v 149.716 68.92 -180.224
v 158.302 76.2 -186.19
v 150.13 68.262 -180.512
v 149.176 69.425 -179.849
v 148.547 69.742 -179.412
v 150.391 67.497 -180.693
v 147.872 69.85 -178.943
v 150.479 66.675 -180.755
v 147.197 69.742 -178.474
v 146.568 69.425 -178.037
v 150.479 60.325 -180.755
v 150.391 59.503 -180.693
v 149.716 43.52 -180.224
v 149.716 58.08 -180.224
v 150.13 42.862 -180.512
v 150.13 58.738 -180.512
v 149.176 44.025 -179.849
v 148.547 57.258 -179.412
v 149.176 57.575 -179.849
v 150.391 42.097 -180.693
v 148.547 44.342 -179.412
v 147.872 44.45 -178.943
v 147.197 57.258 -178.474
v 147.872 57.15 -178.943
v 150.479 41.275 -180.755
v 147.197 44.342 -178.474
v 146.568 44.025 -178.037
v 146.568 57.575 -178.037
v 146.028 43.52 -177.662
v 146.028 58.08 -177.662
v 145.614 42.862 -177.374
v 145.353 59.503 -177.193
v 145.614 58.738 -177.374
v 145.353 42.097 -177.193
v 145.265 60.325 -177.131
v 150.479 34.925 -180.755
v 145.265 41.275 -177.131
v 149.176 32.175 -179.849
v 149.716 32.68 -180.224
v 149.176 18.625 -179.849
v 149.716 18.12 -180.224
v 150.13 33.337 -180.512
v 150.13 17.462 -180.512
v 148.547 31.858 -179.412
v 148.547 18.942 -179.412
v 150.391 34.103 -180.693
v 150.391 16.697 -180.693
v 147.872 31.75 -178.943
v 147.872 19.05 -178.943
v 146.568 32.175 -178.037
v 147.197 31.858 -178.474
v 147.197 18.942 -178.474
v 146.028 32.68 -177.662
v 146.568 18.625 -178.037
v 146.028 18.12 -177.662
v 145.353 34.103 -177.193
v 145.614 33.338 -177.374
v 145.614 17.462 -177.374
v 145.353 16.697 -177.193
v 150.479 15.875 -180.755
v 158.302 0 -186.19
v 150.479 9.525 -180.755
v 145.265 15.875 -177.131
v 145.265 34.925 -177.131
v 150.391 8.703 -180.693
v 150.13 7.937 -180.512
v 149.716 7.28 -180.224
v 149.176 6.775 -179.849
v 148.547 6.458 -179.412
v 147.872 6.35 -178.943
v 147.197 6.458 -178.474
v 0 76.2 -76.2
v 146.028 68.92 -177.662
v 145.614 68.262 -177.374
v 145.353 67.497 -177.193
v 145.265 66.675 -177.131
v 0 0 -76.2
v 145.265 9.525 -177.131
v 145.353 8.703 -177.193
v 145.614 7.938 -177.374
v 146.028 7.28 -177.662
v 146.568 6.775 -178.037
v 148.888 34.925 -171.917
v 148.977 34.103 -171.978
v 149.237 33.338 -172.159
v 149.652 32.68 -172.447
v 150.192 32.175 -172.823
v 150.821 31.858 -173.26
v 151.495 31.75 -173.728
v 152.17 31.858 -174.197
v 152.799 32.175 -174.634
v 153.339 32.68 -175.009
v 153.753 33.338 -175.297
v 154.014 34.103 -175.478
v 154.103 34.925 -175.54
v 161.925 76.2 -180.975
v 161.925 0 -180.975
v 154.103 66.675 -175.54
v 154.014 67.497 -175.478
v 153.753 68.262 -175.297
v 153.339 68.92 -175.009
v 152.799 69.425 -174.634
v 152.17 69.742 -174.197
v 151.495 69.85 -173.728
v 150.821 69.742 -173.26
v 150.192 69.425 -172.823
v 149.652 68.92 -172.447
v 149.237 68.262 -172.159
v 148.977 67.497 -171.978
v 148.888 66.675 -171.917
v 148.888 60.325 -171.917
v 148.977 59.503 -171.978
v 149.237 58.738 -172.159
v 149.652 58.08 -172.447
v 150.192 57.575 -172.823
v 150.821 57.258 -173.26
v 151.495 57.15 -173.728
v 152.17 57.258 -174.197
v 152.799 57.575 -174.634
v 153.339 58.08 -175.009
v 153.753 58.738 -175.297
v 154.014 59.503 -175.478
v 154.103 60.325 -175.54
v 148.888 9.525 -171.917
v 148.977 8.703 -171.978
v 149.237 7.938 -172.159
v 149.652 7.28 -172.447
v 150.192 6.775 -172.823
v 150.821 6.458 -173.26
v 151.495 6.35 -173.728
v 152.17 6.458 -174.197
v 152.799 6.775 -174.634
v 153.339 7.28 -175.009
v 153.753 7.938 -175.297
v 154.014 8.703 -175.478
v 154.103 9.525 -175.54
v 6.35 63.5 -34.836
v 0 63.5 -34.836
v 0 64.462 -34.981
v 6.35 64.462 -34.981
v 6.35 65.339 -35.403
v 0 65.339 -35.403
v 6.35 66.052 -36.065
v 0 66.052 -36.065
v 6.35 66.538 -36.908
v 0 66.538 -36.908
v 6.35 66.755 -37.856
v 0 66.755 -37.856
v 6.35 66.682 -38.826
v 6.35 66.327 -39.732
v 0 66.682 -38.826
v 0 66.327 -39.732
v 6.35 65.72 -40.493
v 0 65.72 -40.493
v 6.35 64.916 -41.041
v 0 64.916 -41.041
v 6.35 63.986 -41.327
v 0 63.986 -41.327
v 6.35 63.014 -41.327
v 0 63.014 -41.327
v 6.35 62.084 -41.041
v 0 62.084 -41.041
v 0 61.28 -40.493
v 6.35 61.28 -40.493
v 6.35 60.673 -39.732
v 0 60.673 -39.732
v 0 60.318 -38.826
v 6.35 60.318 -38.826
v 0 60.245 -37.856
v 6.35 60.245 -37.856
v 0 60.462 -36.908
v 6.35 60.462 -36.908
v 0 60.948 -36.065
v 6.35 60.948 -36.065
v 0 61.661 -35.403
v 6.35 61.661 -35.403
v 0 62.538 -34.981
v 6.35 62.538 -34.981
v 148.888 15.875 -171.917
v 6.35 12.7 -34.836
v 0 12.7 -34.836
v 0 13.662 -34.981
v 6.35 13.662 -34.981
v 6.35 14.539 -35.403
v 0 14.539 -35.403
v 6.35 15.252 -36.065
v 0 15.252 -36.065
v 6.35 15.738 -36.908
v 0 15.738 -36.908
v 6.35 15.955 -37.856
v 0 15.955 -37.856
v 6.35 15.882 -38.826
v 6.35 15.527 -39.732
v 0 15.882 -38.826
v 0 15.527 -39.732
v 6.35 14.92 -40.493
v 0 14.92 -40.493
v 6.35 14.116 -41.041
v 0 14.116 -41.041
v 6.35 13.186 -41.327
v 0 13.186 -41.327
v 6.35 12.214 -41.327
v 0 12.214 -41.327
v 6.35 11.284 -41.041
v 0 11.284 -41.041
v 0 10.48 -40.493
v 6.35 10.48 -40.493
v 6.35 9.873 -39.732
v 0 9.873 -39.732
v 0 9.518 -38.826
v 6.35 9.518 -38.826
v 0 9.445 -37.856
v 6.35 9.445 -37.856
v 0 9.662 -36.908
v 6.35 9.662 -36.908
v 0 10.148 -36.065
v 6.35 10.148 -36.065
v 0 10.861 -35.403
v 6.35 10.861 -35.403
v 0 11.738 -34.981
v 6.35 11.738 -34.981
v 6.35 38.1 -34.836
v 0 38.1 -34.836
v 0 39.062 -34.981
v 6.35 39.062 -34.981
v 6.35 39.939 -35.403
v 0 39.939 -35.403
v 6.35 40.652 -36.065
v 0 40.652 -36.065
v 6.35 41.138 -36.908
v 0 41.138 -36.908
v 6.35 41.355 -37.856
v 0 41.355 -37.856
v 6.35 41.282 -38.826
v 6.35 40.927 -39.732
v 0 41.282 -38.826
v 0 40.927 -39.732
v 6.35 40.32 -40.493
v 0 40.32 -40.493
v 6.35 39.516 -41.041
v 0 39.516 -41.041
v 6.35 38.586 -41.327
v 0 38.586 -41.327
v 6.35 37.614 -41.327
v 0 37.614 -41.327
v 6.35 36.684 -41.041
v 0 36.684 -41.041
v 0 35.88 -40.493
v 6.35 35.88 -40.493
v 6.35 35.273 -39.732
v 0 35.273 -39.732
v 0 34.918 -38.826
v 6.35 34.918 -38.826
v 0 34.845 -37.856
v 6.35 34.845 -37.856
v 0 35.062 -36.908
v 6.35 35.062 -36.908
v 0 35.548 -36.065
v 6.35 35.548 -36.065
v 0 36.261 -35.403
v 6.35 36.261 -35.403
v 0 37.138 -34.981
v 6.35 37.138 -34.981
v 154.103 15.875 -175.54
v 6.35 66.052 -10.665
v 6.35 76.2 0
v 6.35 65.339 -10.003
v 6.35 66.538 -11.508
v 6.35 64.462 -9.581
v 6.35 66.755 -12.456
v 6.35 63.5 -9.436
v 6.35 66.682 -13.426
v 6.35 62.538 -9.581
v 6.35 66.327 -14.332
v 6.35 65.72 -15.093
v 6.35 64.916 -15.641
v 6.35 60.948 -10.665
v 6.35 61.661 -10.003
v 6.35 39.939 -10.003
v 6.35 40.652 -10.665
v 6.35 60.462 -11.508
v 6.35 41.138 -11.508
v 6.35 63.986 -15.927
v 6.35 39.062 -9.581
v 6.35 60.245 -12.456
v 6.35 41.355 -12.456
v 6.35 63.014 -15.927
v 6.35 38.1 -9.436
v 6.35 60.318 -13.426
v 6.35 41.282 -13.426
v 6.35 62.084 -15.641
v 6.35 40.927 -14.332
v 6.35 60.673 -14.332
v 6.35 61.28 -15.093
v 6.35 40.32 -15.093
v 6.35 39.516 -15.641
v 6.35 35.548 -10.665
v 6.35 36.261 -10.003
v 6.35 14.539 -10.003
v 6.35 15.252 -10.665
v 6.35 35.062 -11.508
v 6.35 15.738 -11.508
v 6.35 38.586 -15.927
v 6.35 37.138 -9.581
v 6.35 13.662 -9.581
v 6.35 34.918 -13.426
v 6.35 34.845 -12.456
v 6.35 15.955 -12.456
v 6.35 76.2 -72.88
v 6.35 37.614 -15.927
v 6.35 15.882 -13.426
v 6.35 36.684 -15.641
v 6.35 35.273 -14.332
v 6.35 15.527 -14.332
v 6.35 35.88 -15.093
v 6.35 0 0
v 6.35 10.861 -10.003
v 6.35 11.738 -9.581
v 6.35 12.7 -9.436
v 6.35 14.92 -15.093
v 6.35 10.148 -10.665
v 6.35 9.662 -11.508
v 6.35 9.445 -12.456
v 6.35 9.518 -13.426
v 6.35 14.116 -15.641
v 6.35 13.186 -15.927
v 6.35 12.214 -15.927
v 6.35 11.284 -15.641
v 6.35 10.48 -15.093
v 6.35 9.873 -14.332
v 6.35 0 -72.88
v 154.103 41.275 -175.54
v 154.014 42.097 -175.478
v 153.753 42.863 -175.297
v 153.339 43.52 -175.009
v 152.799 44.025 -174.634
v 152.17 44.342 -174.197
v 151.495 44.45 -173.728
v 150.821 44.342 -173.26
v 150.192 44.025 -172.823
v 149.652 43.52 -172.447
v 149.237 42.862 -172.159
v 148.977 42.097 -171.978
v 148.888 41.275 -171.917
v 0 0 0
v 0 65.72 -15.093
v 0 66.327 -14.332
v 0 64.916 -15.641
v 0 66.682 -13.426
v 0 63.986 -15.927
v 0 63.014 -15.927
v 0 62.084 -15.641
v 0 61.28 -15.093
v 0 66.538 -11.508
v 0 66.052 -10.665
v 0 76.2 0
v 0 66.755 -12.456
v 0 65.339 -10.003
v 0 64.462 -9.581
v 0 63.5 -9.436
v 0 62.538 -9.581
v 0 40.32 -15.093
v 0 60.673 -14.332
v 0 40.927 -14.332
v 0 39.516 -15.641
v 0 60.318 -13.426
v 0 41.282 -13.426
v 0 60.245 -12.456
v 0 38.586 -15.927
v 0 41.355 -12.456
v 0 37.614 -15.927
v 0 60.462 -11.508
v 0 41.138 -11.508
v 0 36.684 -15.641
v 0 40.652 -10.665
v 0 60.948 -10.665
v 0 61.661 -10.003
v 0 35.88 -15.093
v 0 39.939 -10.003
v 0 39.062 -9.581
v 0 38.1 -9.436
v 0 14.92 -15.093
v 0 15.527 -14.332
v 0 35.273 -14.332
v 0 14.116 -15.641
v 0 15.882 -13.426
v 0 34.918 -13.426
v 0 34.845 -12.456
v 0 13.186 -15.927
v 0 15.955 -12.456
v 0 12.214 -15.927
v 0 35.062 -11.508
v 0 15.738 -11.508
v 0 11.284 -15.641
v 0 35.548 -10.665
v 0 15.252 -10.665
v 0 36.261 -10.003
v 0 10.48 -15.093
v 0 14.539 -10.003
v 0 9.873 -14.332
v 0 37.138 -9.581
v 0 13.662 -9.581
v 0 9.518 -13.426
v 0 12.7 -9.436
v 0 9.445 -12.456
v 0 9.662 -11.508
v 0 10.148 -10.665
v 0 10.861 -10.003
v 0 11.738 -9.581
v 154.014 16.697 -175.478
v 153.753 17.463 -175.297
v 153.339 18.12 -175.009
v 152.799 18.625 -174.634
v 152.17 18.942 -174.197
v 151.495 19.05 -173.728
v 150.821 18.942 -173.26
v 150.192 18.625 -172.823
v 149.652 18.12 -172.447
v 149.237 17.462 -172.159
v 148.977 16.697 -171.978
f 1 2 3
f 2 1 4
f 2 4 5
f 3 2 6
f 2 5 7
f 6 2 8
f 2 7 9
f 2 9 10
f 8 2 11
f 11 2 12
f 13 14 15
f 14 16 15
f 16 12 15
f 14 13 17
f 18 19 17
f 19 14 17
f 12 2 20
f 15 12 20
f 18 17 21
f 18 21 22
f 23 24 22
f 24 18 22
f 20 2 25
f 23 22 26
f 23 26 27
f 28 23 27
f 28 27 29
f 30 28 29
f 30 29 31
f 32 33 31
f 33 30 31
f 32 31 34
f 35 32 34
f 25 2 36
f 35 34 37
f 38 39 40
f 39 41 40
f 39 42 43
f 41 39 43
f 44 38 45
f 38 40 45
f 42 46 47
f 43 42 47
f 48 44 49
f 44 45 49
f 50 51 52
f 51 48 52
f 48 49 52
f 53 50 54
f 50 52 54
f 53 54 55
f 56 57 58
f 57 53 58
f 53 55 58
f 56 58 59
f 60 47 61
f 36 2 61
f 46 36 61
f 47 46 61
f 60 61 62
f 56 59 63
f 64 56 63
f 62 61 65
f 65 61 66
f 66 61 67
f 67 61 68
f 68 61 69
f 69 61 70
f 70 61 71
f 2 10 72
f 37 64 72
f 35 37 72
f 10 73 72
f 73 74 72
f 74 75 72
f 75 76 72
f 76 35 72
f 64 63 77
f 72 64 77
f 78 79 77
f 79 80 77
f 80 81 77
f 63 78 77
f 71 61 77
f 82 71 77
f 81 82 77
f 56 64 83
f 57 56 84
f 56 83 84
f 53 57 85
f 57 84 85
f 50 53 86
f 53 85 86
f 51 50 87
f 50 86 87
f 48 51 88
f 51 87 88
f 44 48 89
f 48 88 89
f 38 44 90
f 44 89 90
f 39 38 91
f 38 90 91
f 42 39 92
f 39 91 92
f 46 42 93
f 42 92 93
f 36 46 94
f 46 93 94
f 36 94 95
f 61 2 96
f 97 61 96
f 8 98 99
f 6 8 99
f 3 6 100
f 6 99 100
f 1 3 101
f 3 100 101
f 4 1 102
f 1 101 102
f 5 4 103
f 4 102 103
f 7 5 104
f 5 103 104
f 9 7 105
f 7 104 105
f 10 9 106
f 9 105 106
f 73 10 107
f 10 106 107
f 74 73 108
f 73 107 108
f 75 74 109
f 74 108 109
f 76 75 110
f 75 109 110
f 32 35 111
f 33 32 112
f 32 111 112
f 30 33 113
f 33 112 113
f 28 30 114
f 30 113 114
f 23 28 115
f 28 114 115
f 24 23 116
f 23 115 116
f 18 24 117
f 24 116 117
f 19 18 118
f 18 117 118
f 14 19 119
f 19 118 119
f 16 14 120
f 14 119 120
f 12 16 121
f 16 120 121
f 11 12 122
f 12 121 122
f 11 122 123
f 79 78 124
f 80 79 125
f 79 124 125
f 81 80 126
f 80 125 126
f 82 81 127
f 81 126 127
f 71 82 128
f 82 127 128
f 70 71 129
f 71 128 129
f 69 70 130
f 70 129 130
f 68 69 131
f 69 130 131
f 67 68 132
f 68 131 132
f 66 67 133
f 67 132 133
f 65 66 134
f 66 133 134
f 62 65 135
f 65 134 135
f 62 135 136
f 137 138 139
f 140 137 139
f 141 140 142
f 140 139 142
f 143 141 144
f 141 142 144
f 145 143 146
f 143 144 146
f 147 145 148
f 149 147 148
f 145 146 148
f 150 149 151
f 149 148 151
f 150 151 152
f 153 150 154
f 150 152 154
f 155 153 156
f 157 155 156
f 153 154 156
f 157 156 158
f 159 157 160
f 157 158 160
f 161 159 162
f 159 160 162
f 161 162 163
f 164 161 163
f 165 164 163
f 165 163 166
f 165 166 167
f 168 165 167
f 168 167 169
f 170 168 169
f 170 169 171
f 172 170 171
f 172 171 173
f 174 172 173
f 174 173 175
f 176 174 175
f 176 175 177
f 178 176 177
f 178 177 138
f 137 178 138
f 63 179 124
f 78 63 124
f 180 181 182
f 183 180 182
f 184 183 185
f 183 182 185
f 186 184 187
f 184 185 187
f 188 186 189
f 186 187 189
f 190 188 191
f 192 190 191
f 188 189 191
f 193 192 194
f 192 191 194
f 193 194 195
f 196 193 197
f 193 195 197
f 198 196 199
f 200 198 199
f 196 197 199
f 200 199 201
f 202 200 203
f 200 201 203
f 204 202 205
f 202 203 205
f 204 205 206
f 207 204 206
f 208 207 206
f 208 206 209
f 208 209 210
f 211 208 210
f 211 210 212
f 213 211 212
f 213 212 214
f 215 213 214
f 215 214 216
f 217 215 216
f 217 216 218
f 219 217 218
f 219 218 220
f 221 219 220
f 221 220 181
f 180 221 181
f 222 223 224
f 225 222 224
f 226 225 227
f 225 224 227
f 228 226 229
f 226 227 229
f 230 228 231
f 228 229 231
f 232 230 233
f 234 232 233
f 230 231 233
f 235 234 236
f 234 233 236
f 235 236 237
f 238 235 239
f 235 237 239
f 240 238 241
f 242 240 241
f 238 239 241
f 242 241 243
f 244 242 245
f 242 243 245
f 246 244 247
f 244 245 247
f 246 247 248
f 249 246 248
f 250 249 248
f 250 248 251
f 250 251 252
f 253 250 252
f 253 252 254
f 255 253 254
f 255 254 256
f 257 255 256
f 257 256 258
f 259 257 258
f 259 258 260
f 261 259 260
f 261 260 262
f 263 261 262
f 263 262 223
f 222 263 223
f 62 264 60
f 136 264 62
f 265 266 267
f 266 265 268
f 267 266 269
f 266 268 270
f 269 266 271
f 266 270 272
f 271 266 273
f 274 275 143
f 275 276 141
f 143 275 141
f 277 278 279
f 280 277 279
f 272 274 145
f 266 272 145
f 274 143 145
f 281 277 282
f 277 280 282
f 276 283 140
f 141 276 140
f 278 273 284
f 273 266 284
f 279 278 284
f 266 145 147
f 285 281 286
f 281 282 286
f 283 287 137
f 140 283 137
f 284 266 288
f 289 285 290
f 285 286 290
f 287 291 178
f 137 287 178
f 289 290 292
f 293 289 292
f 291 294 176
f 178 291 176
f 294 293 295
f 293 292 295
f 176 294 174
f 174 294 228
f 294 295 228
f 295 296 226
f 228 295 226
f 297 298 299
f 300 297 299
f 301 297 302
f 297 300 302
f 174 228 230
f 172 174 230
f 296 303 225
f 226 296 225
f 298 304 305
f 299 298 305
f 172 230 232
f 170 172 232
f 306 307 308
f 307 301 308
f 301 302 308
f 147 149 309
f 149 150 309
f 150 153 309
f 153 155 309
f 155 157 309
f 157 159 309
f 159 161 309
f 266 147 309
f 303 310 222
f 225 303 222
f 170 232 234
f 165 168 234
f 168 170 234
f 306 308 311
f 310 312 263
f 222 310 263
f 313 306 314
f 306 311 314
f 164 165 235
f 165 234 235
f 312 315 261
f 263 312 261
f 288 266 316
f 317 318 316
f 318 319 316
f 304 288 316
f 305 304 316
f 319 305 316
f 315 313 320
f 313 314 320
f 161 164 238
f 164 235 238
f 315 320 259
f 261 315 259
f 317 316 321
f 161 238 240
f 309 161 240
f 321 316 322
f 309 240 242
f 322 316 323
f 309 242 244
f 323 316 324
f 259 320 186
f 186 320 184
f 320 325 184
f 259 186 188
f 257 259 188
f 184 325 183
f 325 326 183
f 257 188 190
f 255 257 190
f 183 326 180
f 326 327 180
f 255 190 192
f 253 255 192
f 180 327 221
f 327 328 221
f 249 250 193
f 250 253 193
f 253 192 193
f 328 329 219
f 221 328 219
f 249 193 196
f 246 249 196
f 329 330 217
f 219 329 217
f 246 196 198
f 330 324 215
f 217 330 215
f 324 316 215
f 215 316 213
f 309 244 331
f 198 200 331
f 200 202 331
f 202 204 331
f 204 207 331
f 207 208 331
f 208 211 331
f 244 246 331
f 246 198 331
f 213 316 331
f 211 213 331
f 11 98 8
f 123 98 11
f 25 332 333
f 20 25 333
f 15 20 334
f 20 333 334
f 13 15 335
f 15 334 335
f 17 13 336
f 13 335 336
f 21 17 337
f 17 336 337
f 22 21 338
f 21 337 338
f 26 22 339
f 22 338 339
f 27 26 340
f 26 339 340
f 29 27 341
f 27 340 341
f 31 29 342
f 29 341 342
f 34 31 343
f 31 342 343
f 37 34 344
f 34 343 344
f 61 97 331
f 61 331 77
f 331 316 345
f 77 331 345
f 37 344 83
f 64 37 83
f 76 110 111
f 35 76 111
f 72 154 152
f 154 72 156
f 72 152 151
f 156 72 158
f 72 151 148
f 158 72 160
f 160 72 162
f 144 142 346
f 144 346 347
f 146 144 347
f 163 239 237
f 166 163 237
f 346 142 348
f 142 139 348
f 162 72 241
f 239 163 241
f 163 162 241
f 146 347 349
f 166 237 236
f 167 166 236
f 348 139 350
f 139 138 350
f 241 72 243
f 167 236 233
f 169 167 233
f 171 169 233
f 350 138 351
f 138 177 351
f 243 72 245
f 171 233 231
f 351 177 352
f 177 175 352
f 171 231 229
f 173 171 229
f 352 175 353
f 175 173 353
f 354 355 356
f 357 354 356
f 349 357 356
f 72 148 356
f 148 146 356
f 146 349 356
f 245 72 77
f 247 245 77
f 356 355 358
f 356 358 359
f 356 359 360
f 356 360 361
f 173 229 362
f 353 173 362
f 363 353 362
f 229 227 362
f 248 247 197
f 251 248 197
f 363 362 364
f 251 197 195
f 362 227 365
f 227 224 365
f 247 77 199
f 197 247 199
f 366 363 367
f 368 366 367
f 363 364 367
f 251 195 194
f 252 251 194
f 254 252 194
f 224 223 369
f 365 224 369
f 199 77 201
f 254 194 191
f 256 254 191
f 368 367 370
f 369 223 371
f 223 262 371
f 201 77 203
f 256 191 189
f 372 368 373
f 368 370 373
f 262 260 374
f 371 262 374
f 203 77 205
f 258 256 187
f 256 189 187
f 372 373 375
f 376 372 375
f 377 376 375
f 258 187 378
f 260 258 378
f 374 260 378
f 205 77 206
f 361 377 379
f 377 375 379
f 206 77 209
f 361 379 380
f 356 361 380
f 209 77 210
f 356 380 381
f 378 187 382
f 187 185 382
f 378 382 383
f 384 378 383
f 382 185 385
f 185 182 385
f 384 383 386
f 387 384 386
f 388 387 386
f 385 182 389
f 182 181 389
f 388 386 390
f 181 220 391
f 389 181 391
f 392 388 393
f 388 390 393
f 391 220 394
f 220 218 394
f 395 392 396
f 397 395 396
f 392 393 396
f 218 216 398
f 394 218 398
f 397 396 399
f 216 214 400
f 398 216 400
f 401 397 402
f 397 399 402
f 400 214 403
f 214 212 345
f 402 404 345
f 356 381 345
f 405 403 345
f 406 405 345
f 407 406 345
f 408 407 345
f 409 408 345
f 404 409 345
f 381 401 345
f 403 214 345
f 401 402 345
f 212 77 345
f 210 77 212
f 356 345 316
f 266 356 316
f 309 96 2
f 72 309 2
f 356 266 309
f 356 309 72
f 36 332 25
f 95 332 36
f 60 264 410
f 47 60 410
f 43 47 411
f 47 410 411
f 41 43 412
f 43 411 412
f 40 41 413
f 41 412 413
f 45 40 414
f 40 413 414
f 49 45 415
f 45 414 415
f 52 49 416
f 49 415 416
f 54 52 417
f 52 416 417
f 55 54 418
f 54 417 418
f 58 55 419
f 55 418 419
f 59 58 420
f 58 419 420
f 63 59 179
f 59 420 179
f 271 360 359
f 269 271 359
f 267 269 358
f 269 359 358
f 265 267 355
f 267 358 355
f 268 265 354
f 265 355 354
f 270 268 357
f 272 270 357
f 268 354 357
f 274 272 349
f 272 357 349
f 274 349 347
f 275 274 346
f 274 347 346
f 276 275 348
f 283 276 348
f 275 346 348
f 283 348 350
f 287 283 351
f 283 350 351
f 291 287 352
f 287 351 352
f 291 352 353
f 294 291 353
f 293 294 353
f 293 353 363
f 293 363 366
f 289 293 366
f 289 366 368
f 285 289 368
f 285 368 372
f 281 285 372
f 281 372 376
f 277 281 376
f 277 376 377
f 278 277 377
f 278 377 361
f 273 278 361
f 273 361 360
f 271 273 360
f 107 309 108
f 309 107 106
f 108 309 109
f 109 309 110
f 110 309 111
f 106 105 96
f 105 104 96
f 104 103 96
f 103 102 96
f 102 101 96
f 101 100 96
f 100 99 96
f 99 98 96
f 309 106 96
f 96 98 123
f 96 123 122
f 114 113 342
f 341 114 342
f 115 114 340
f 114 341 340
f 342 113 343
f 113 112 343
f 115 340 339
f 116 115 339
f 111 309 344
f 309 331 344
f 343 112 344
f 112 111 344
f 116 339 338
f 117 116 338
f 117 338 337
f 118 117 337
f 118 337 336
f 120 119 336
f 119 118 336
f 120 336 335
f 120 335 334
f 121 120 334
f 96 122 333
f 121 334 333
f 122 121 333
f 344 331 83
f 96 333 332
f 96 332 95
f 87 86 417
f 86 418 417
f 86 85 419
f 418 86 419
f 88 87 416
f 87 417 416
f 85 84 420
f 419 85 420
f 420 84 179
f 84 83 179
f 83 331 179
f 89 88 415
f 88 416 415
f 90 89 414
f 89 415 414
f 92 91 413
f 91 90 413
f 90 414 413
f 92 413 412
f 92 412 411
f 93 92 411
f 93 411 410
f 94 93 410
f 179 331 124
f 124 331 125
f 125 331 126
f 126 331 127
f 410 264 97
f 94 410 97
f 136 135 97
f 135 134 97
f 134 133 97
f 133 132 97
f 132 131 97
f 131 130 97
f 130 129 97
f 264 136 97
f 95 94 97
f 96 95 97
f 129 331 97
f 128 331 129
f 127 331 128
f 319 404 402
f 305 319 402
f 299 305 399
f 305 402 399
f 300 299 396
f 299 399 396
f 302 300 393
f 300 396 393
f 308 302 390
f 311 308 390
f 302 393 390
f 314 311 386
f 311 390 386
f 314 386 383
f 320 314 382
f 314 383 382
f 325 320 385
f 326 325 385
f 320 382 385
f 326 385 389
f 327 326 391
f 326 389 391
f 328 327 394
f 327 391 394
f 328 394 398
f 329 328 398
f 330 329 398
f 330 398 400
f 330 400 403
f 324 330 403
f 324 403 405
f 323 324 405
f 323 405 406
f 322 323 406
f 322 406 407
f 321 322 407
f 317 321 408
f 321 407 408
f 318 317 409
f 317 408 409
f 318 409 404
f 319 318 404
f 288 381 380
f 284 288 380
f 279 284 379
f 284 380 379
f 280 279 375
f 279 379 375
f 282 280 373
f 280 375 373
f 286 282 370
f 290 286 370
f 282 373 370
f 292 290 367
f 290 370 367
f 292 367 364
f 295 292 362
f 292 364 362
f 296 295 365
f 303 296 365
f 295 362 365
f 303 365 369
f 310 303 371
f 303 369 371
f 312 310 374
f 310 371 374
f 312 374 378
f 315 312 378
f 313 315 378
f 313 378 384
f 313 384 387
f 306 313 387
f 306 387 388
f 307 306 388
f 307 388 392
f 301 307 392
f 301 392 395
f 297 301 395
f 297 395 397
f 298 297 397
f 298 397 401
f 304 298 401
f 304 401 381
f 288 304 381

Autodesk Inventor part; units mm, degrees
ref_plane "YZ Plane" through (0, 0, 0) normal (1, 0, 0) x (0, 1, 0)
ref_plane "XZ Plane" through (0, 0, 0) normal (0, 1, 0) x (-1, 0, 0)
ref_plane "XY Plane" through (0, 0, 0) normal (0, 0, 1) x (1, 0, 0)
sketch "Sketch1" plane through (0, 0, 0) normal (0, 1, 0) x (-1, 0, 0)
  line L0 (0, 0) -> (-6.35, 0)
  line L1 (-6.35, 0) -> (-6.35, -76.2)
  line L2 (-6.35, -76.2) -> (0, -76.2)
  line L3 (0, -76.2) -> (0, 0)
  line L4 (-6.35, -72.8797) -> (-161.925, -180.975)
  line L5 (-158.3017, -186.1898) -> (0, -76.2)
  line L6 (-158.3017, -186.1898) -> (-161.925, -180.975)
  point P0 (-6.35, -38.1)
  point P1 (-3.175, -76.2)
  point P2 (-6.35, -6.35)
  dimension "d9" = 6.35
  dimension "d10" = 76.2
  dimension "d30" = 6.35
  dimension "d31" = 6.35
  dimension "d32" = 155.575
  dimension "d33" = 174.625
  dimension "d53" = 6.35
extrude "Extrusion1" add sketch "Sketch1" along normal blind 76.2
sketch "Sketch2" plane through (0, 0, -76.2) normal (-1, 0, 0) x (0, 0, 1)
  circle A0 centre (63.5, 12.7) radius 3.2639
  circle A1 centre (63.5, 38.1) radius 3.2639
  circle A2 centre (63.5, 63.5) radius 3.2639
  line L0 (0, 0) -> (0, 76.2) projected
  line L1 (0, 0) -> (76.2, 0) projected
  line L2 (76.2, 0) -> (76.2, 76.2) projected
  circle A3 centre (38.1, 63.5) radius 3.2639
  circle A4 centre (38.1, 38.1) radius 3.2639
  circle A5 centre (38.1, 12.7) radius 3.2639
  dimension "d18" = 6.5278
  dimension "d19" = 25.4
  dimension "d21" = 25.4
  dimension "d22" = 12.7
  dimension "d34" = 12.7
  dimension "d35" = 25.4
  dimension "d36" = 25.4
  dimension "d38" = 25.4
extrude "Extrusion2" cut sketch "Sketch2" against normal through all
sketch "Sketch4" plane through (161.925, 0, -180.975) normal (0.5706, 0, 0.8212) x (0.8212, 0, -0.5706)
  arc A0 (-9.525, 66.675) -> (-15.875, 66.675) centre (-12.7, 66.675) ccw
  arc A1 (-15.875, 60.325) -> (-9.525, 60.325) centre (-12.7, 60.325) ccw
  line L0 (-12.7, 76.4683) -> (-12.7, 0) construction
  line L1 (-189.4417, 0) -> (0, 0) construction
  line L2 (0, 0) -> (0, 76.2) construction
  line L3 (-15.875, 66.675) -> (-15.875, 60.325)
  line L4 (-9.525, 66.675) -> (-9.525, 60.325)
  arc A2 (-9.525, 41.275) -> (-15.875, 41.275) centre (-12.7, 41.275) ccw
  line L5 (-15.875, 41.275) -> (-15.875, 34.925)
  line L6 (-9.525, 41.275) -> (-9.525, 34.925)
  arc A3 (-15.875, 34.925) -> (-9.525, 34.925) centre (-12.7, 34.925) ccw
  arc A4 (-9.525, 15.875) -> (-15.875, 15.875) centre (-12.7, 15.875) ccw
  line L7 (-15.875, 15.875) -> (-15.875, 9.525)
  line L8 (-9.525, 15.875) -> (-9.525, 9.525)
  arc A5 (-15.875, 9.525) -> (-9.525, 9.525) centre (-12.7, 9.525) ccw
  point P0 (-236.2416, 0)
  point P1 (-182.3346, 0)
  point P2 (-9.525, 63.5)
  point P3 (-9.525, 38.1)
  point P4 (-9.525, 12.7)
  dimension "d39" = 6.35
  dimension "d40" = 6.35
  dimension "d41" = 6.35
  dimension "d42" = 12.7
  dimension "d43" = 63.5
  dimension "d46" = 25.4
extrude "Extrusion3" cut sketch "Sketch4" against normal through all
properties part number "INDX_006_Funnel" material "ABS Plastic"
